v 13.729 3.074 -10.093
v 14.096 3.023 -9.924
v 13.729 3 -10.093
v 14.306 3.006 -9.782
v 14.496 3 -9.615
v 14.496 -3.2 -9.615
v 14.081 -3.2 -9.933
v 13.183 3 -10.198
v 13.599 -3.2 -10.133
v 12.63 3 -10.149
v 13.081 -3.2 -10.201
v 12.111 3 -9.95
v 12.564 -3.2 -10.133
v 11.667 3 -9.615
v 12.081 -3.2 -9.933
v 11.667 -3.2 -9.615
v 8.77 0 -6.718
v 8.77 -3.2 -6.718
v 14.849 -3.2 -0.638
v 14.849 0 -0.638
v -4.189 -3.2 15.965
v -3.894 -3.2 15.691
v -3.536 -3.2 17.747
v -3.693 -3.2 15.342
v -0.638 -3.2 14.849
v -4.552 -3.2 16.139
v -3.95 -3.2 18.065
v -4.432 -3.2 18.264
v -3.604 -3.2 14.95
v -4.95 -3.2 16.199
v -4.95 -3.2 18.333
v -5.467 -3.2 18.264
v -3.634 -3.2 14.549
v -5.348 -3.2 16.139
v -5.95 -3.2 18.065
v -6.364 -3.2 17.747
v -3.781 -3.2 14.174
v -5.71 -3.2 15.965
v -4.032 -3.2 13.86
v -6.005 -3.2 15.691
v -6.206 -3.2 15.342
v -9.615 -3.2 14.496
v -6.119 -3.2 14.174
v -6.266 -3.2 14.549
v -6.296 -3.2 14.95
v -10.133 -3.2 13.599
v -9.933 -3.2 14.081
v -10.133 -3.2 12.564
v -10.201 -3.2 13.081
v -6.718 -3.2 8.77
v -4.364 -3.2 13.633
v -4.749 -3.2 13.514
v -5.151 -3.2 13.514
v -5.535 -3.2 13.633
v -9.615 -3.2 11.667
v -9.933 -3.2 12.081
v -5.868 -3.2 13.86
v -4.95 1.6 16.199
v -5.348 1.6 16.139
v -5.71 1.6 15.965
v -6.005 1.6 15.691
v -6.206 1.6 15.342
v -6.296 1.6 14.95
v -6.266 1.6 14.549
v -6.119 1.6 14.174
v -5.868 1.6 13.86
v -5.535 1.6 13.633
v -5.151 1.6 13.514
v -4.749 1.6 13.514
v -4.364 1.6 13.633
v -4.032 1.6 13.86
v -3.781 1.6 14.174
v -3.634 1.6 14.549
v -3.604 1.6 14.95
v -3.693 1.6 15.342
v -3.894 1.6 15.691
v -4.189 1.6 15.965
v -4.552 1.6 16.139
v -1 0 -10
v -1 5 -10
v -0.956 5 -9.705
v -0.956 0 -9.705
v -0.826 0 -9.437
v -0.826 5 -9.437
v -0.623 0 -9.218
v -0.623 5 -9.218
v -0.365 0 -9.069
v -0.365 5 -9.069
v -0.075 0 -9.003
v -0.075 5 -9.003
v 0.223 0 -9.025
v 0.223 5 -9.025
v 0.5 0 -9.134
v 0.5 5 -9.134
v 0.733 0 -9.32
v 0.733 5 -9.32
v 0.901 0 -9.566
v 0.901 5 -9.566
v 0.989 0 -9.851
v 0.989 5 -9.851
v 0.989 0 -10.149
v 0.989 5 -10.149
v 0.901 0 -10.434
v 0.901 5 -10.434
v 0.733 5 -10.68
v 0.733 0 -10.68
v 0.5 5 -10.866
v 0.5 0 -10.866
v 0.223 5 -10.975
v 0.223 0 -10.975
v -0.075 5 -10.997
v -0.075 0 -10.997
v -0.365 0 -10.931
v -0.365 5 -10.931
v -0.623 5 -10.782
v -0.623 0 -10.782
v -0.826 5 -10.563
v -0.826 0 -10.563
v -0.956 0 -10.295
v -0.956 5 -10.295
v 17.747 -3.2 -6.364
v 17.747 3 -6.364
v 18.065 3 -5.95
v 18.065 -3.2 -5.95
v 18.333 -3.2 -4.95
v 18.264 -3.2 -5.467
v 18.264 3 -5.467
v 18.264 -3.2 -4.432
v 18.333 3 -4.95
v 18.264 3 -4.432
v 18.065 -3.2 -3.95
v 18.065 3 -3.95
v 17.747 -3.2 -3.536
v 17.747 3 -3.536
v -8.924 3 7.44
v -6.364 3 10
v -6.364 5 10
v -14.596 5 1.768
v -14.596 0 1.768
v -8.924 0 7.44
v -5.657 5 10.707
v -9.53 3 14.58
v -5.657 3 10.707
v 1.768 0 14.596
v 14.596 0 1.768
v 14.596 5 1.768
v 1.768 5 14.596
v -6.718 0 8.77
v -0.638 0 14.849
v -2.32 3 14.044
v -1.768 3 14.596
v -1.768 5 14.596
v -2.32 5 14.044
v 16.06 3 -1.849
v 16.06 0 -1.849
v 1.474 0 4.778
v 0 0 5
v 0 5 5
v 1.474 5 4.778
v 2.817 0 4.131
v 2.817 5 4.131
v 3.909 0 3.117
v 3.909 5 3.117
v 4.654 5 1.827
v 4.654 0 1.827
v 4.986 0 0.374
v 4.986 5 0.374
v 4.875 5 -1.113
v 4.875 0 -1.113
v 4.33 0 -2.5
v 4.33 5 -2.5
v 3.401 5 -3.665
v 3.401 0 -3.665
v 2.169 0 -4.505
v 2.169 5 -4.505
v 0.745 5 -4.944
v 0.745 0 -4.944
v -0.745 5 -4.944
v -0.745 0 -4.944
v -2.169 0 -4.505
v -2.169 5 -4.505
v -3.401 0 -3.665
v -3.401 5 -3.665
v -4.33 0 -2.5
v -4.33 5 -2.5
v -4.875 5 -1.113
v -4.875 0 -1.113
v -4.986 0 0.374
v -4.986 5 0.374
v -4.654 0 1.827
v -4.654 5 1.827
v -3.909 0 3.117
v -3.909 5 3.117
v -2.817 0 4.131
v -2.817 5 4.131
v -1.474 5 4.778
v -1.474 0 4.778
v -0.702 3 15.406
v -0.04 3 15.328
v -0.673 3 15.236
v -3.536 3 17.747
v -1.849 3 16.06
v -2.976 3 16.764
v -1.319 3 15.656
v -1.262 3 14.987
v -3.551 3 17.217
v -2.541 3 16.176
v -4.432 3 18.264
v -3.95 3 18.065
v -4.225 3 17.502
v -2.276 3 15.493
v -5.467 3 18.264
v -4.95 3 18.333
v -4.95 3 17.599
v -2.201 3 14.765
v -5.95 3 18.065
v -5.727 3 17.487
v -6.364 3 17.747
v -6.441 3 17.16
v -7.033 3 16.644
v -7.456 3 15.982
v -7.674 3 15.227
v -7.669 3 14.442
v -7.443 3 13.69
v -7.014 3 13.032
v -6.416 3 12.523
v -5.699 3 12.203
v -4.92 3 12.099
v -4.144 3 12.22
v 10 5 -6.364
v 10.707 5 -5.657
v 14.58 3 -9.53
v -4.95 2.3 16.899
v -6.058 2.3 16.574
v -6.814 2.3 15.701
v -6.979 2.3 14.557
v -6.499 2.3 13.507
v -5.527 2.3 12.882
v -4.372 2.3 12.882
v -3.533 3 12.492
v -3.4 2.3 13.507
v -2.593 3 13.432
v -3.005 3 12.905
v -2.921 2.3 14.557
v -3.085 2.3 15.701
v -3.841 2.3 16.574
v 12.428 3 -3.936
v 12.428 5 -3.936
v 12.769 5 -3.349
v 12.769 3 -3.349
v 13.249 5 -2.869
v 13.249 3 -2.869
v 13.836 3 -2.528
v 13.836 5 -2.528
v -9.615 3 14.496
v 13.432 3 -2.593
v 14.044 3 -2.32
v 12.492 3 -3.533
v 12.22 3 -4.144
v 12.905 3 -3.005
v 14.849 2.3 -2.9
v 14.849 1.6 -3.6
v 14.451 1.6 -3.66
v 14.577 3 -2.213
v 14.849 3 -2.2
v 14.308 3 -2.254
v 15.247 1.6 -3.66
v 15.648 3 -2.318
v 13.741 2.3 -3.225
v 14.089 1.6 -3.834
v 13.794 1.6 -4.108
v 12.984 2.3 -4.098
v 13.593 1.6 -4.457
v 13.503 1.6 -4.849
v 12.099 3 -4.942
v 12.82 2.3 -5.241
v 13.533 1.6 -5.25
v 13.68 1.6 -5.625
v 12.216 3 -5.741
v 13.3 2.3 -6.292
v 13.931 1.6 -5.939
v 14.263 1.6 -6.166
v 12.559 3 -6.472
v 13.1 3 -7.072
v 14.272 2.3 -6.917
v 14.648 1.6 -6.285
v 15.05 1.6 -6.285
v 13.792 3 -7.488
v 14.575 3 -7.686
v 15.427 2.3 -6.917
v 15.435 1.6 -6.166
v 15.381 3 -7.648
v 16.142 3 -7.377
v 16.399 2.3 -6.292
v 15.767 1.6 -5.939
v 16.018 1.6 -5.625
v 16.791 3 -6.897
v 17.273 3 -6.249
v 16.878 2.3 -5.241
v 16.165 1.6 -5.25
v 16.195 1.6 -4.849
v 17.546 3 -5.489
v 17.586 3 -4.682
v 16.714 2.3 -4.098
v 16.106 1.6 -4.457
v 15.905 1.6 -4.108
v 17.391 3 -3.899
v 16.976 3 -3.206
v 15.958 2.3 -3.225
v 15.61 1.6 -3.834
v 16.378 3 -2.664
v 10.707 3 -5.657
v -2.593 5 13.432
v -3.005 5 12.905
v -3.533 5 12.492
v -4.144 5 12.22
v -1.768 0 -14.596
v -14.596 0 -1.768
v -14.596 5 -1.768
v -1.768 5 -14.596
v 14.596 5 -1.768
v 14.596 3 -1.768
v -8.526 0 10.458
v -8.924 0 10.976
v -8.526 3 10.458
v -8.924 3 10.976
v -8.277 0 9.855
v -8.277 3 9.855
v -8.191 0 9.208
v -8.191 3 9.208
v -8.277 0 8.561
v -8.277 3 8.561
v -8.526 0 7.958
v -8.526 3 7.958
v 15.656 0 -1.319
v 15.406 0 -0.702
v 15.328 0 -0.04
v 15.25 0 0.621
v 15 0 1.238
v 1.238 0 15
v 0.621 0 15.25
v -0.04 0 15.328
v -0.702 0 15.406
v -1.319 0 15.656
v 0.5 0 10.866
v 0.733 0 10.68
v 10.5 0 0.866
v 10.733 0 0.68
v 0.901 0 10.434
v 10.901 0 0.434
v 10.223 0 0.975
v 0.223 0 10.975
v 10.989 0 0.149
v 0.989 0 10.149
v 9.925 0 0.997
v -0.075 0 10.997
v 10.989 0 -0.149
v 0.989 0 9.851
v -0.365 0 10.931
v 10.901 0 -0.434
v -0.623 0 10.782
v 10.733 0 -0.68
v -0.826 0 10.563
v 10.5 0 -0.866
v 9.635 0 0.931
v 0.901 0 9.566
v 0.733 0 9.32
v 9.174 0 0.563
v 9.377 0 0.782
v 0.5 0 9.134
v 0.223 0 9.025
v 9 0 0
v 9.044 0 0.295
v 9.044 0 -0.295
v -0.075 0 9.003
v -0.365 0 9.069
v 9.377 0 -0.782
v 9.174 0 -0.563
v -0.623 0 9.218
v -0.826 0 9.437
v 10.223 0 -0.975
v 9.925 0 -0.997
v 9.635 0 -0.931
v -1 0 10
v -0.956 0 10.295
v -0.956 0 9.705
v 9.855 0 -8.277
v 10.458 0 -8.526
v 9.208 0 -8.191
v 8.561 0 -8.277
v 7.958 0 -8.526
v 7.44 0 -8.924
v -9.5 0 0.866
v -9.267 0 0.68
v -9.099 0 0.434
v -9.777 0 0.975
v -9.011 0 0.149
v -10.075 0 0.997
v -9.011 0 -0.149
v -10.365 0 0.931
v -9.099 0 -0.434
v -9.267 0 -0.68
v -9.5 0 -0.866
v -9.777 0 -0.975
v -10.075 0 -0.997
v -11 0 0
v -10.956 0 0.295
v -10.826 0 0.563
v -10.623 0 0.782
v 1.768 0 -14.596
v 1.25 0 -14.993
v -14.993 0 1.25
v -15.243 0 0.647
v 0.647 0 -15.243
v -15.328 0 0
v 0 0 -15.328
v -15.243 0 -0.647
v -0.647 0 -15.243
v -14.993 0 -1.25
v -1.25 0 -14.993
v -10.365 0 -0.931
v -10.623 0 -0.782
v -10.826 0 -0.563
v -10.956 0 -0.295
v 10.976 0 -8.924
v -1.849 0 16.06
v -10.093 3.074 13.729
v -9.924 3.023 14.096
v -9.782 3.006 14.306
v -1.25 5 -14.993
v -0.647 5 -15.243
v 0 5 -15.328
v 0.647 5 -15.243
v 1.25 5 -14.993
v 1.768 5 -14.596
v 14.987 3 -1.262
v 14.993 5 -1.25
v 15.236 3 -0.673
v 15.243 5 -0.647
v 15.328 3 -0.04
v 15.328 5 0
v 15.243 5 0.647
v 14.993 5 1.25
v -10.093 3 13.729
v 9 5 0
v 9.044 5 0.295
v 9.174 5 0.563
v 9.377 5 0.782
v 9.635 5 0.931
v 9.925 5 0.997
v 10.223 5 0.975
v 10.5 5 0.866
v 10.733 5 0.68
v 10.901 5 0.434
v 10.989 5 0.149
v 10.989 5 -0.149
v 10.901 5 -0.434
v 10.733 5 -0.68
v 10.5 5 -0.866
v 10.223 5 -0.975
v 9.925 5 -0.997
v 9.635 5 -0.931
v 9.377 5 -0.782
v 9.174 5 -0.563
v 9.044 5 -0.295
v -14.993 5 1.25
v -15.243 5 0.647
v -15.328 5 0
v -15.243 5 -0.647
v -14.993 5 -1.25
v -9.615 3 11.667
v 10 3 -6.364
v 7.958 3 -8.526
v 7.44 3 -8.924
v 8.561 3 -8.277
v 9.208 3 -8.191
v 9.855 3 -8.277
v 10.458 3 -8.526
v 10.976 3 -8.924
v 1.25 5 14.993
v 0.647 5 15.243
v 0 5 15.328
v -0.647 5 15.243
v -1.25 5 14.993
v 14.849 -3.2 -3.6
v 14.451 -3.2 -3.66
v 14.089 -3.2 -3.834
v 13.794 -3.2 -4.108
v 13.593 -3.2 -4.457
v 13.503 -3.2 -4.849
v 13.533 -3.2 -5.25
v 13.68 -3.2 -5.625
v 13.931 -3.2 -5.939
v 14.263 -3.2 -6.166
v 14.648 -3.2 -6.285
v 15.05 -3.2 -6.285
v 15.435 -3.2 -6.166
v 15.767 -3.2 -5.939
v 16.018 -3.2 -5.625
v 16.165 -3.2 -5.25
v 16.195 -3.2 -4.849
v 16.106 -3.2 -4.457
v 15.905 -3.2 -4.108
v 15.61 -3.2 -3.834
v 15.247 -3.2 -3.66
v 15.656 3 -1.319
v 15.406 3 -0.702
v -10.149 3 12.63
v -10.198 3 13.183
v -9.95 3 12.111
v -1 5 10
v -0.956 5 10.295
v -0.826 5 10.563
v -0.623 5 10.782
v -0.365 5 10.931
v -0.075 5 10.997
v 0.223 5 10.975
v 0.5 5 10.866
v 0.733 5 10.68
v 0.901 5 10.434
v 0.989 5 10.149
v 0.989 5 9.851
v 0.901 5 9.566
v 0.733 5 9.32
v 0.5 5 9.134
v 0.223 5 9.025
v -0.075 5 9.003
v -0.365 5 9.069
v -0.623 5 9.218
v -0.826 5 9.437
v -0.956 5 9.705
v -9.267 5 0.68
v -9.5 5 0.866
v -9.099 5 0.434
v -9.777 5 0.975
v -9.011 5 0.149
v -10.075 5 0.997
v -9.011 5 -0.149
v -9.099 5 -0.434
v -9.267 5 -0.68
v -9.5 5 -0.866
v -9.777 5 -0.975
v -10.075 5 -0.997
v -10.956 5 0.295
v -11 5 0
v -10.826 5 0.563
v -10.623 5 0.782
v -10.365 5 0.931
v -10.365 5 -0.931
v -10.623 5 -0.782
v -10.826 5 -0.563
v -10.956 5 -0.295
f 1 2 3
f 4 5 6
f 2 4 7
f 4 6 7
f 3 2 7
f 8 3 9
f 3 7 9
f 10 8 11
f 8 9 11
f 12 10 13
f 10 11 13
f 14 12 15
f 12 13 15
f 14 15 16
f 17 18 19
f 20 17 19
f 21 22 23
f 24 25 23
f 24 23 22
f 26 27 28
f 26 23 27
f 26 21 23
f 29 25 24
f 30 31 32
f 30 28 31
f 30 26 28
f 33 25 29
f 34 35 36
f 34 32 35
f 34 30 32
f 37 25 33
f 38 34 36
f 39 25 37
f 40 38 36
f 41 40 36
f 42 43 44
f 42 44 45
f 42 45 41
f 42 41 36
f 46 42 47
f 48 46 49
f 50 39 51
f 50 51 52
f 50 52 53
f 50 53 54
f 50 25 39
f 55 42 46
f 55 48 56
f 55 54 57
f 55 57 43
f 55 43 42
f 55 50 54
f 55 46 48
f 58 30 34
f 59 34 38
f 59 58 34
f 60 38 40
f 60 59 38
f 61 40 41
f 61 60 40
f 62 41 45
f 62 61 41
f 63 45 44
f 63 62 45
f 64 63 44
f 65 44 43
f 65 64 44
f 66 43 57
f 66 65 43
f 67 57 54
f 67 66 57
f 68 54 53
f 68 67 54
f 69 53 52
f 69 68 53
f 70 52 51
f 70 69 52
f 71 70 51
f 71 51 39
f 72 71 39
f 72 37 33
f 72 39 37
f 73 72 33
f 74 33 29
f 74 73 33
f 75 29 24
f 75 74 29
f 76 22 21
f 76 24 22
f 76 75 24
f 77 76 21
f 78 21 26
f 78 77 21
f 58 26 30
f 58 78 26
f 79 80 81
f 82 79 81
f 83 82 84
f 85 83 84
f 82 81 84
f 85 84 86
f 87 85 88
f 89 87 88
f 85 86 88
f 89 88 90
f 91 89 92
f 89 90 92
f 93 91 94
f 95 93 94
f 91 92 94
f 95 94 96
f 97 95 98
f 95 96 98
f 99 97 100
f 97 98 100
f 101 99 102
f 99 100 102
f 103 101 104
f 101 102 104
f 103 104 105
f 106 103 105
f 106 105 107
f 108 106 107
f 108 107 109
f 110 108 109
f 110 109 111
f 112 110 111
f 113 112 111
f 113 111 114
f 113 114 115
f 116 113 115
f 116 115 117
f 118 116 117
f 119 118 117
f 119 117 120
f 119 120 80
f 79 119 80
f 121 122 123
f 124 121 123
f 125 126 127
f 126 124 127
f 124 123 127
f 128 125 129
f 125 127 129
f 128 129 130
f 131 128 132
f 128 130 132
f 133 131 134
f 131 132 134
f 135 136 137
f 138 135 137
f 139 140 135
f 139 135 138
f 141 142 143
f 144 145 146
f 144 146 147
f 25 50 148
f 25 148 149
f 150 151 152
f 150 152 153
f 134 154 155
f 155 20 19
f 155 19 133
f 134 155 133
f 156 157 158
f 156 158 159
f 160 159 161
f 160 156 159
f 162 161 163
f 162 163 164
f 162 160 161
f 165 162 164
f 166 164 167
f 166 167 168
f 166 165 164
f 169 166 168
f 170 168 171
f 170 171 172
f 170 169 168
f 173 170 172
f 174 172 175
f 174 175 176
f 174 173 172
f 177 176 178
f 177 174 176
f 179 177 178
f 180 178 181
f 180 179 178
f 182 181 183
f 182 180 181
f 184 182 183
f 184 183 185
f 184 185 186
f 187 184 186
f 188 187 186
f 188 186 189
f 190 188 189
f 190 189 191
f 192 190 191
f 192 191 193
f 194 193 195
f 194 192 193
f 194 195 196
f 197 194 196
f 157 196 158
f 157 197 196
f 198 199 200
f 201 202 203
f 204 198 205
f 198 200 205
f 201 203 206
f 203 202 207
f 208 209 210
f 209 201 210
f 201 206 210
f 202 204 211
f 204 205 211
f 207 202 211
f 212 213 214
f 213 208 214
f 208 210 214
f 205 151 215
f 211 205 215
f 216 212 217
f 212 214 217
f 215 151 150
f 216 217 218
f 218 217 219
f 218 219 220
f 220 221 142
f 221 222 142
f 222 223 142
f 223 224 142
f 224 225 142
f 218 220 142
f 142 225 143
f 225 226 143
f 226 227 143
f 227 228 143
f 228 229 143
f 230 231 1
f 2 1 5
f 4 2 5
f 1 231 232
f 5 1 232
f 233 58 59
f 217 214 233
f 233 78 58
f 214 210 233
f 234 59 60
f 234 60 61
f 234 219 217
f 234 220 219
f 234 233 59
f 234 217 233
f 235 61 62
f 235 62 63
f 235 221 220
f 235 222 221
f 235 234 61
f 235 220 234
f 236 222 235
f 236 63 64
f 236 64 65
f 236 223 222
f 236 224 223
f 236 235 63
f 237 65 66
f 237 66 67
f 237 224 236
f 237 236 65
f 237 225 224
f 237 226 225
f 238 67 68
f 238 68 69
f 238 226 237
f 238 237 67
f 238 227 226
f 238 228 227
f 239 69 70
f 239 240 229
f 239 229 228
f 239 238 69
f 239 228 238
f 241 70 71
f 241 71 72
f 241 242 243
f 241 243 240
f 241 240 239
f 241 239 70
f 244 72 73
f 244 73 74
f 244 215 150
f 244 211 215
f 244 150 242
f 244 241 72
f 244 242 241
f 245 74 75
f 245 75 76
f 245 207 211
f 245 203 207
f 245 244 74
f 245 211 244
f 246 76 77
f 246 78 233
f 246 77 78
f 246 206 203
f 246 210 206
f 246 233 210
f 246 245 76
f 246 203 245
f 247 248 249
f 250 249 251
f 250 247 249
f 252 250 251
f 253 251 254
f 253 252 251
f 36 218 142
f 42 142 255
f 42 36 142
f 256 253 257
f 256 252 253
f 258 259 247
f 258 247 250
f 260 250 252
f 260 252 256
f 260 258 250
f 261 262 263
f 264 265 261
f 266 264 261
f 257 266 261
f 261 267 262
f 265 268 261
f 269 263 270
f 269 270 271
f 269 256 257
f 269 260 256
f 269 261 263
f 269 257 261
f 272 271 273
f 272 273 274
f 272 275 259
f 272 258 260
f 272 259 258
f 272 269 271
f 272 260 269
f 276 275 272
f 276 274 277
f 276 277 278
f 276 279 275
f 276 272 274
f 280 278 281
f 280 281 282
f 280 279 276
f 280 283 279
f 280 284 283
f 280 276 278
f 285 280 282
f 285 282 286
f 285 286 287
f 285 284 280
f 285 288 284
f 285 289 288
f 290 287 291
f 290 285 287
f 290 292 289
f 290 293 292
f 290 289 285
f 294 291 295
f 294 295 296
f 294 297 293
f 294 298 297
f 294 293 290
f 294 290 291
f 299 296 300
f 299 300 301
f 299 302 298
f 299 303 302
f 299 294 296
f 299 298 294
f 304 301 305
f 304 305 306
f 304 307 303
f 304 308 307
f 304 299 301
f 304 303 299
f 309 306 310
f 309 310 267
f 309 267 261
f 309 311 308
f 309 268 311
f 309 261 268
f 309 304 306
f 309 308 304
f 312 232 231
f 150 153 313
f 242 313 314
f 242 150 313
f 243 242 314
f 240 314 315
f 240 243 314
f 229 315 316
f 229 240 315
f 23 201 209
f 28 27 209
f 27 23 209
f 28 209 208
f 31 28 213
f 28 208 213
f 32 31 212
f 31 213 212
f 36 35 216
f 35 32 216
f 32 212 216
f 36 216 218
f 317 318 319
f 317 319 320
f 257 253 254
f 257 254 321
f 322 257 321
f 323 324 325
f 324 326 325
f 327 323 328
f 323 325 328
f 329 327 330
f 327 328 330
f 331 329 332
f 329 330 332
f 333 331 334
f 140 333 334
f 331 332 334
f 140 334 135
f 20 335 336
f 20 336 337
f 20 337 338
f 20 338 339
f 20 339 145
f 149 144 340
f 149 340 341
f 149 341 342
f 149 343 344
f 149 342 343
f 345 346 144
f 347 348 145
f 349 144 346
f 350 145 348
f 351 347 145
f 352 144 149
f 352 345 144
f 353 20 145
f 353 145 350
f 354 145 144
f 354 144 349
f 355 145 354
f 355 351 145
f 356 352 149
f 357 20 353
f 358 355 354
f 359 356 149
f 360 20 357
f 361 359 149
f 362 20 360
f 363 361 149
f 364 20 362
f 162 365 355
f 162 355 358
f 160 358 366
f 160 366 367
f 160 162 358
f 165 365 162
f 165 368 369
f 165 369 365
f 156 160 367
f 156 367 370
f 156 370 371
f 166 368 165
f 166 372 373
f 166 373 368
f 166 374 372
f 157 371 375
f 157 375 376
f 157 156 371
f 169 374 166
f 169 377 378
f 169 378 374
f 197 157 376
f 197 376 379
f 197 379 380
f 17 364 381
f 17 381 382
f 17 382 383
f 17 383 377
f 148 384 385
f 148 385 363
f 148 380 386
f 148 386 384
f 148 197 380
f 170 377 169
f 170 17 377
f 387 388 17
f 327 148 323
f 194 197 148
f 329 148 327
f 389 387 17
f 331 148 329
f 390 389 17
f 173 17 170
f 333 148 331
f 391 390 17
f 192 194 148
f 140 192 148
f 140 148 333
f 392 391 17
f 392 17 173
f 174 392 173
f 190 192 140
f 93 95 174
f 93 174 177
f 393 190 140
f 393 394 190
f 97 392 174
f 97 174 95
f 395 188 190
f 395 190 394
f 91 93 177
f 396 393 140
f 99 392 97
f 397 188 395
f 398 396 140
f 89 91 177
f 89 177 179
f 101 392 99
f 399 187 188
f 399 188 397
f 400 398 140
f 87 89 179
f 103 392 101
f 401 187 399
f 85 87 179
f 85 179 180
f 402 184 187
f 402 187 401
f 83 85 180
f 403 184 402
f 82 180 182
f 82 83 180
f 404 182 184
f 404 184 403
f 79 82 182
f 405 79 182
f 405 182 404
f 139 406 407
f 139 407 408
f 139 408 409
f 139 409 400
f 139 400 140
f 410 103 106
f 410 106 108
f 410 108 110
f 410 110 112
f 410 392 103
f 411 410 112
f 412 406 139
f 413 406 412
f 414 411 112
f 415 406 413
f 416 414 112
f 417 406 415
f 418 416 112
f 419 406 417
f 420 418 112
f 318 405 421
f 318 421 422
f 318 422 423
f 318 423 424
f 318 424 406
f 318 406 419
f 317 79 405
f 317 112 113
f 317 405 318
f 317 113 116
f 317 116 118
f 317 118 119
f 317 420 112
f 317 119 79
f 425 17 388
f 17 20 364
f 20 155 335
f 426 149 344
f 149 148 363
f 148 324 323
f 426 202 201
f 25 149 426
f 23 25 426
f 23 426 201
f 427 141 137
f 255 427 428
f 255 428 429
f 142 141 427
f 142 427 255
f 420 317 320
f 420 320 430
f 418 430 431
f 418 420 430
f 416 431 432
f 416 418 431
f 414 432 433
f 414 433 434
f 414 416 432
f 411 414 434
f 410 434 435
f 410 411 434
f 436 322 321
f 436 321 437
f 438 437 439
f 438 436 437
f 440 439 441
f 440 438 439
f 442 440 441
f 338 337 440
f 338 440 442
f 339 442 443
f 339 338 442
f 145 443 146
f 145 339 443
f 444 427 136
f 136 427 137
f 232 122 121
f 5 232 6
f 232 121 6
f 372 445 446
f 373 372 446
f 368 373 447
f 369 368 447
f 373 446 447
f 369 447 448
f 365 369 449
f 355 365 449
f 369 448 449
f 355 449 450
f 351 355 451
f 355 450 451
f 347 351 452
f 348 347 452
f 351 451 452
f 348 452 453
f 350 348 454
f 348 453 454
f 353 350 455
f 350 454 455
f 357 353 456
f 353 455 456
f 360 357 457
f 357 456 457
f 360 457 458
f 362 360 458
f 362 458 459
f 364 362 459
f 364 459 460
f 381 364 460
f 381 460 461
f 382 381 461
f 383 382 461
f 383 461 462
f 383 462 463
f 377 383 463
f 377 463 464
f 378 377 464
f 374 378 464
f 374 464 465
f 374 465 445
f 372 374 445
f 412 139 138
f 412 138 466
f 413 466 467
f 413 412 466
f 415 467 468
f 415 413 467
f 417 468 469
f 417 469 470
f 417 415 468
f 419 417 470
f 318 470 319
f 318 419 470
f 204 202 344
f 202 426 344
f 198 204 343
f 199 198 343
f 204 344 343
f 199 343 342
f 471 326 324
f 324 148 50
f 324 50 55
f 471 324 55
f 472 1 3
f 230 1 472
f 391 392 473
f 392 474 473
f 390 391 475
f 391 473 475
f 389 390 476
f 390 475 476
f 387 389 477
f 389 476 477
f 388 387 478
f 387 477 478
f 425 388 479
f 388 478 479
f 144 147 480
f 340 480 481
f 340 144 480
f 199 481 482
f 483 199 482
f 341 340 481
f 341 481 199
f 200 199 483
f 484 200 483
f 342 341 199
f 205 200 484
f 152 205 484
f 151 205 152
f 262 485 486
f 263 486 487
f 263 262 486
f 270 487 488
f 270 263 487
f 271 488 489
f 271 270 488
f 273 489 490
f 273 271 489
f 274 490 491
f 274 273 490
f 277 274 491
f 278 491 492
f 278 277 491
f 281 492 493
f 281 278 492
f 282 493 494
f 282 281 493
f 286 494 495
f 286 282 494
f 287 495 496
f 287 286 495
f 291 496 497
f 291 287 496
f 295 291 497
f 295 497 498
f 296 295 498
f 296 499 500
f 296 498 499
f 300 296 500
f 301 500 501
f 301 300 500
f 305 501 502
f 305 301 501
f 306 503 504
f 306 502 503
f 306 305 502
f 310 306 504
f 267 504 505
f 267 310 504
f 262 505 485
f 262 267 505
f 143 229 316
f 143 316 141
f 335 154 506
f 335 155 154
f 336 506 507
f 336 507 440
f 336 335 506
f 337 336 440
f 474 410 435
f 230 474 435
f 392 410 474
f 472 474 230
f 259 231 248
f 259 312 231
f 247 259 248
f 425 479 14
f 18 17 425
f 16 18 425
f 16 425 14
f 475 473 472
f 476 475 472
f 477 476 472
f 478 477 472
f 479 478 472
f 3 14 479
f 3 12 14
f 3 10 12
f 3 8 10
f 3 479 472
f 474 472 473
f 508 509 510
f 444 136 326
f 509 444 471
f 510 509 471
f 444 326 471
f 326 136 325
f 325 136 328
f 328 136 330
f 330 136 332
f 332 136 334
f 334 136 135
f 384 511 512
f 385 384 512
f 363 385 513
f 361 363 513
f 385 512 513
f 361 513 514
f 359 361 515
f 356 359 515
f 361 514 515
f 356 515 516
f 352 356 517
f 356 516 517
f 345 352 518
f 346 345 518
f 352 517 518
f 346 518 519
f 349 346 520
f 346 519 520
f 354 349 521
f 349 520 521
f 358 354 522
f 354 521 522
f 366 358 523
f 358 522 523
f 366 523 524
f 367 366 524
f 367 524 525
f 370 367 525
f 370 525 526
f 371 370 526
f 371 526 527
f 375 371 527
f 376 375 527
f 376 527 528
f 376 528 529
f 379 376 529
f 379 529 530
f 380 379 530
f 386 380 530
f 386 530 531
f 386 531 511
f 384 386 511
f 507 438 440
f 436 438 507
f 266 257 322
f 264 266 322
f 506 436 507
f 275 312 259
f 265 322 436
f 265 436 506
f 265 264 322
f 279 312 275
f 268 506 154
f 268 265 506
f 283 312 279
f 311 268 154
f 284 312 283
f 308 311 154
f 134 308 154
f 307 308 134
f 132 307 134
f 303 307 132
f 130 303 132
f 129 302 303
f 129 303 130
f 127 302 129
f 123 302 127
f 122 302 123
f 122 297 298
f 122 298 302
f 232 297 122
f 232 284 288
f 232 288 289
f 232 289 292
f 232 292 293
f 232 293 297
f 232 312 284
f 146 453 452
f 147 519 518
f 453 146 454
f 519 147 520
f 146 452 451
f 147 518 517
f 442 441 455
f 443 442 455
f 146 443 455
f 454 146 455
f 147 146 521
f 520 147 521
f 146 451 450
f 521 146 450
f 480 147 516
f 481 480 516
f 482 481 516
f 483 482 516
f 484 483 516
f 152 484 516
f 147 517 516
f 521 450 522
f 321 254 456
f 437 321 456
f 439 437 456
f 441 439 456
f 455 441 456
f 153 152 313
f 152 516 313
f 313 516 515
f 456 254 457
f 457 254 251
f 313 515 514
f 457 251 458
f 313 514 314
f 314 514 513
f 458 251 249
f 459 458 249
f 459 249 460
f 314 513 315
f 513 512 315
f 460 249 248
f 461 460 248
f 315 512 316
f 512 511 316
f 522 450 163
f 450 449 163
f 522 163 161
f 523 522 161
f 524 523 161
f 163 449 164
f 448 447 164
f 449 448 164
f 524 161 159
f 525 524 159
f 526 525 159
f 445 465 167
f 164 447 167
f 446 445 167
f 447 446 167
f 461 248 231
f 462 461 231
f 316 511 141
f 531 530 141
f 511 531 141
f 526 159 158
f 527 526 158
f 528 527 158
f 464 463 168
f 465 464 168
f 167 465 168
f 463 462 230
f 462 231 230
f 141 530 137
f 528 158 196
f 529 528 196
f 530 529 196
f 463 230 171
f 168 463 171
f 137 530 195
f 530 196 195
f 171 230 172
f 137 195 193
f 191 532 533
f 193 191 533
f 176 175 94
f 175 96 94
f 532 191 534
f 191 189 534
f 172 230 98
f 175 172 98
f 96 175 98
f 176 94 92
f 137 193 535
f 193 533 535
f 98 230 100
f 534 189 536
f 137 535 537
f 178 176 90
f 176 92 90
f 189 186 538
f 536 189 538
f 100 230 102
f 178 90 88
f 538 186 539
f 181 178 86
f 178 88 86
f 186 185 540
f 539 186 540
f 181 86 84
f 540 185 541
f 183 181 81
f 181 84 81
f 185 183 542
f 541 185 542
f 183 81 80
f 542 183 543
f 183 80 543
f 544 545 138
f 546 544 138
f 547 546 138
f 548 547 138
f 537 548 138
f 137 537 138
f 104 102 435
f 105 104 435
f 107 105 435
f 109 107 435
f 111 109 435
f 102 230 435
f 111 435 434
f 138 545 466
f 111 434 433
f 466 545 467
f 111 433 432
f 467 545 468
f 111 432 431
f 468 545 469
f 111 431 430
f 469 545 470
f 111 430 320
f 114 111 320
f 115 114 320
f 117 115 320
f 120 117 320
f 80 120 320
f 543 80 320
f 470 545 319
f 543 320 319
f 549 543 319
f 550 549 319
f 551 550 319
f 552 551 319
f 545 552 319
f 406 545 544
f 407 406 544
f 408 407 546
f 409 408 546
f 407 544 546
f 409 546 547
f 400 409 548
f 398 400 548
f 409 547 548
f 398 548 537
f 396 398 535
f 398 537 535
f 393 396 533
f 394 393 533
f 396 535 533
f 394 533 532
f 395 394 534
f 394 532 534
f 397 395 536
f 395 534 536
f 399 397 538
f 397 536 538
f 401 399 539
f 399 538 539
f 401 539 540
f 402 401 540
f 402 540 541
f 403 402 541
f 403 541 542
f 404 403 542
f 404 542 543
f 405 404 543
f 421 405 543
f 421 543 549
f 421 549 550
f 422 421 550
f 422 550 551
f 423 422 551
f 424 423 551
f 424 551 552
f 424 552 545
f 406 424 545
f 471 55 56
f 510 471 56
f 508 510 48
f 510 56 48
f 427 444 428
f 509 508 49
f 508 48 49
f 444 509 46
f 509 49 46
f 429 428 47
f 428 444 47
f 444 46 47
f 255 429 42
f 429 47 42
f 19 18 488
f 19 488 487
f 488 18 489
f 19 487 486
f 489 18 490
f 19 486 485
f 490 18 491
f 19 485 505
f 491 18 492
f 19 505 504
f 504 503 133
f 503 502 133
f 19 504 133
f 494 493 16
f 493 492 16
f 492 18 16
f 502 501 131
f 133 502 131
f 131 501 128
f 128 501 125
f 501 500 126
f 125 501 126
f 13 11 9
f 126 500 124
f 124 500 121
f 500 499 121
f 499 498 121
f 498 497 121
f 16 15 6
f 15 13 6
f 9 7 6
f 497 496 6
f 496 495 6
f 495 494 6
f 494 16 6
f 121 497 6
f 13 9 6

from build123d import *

# Parameters (mm, degrees)
SKETCH1_R                                      = 0.5
SKETCH1_R_2                                    = 5
BOSS_EXTRUDE1_DEPTH                            = 5
BOSS_EXTRUDE4_DEPTH                            = 5.7
BOSS_EXTRUDE4_DEPTH_BACK                       = 0.5
SKETCH3_R                                      = 1.3
BOSS_EXTRUDE6_DEPTH                            = 1
FILLET1_R                                      = 2.5
FILLET2_R                                      = 2
F_2_0MM_DOWEL_HOLE1_D                          = 2
F_2_0MM_DOWEL_HOLE1_DEPTH                      = 42.93
F_2_0MM_DOWEL_HOLE1_TIP                        = 0.600860619
SKETCH12_R                                     = 2.75
SKETCH12_R_2                                   = 2.625
CUT_EXTRUDE1_DEPTH                             = 10
CSK_FOR_M2_5_FLAT_HEAD_MACHINE_SCREW1_AT_COUNT = 2
CSK_FOR_M2_5_FLAT_HEAD_MACHINE_SCREW1_AT_PITCH = 28


with BuildPart() as part:
    # Sketch1 → Boss-Extrude1 (new body)
    with BuildSketch(Plane(origin=(0, 0, 0), x_dir=(1, 0, 0), z_dir=(0, 1, 0))):
        with BuildLine():
            Line((1.767766953, 14.596194078), (14.596194078, 1.767766953))
            ThreePointArc((14.596194078, 1.767766953), (15.328427125, 0), (14.596194078, -1.767766953))
            Line((14.596194078, -1.767766953), (1.767766953, -14.596194078))
            ThreePointArc((1.767766953, -14.596194078), (0, -15.328427125), (-1.767766953, -14.596194078))
            Line((-1.767766953, -14.596194078), (-14.596194078, -1.767766953))
            ThreePointArc((-14.596194078, -1.767766953), (-15.328427125, 0), (-14.596194078, 1.767766953))
            Line((-14.596194078, 1.767766953), (-1.767766953, 14.596194078))
            ThreePointArc((-1.767766953, 14.596194078), (0, 15.328427125), (1.767766953, 14.596194078))
        make_face()
        with Locations(Location((0, 10, 0), (0, 0, 270))):
            Circle(SKETCH1_R, mode=Mode.SUBTRACT)
        with Locations(Location((0, -10, 0), (0, 0, 270))):
            Circle(SKETCH1_R, mode=Mode.SUBTRACT)
        with Locations(Location((10, 0, 0), (0, 0, 270))):
            Circle(SKETCH1_R, mode=Mode.SUBTRACT)
        with Locations(Location((-10, 0, 0), (0, 0, 270))):
            Circle(SKETCH1_R, mode=Mode.SUBTRACT)
        with Locations(Location((0, 0, 0), (0, 0, 270))):
            Circle(SKETCH1_R_2, mode=Mode.SUBTRACT)
    extrude(amount=BOSS_EXTRUDE1_DEPTH)

    # Sketch3 → Boss-Extrude4 (add, two sides: drawn at the far end of the back side and taken through both)
    # profile 1 of 4: a face of its own
    with BuildSketch(Plane(origin=(0, -2.7, 0), x_dir=(1, 0, 0), z_dir=(0, 1, 0)).offset(-BOSS_EXTRUDE4_DEPTH_BACK)):
        Polygon((-4.949747468, -10.537489101), (-0.637994164, -14.849242405), (-4.949747468, -19.160995709), (-9.261500772, -14.849242405), align=None)
        with Locations(Location((-4.949747468, -14.849242405, 0), (0, 0, 270))):
            Circle(SKETCH3_R, mode=Mode.SUBTRACT)
    # profile 2 of 4: a face of its own
    with BuildSketch(Plane(origin=(0, -2.7, 0), x_dir=(1, 0, 0), z_dir=(0, 1, 0)).offset(-BOSS_EXTRUDE4_DEPTH_BACK)):
        Polygon((-6.717514421, -8.769722148), (-11.029267725, -13.081475452), (-9.261500772, -14.849242405), (-4.949747468, -10.537489101), align=None)
    # profile 3 of 4: a face of its own
    with BuildSketch(Plane(origin=(0, -2.7, 0), x_dir=(1, 0, 0), z_dir=(0, 1, 0)).offset(-BOSS_EXTRUDE4_DEPTH_BACK)):
        Polygon((19.160995709, 4.949747468), (14.849242405, 9.261500772), (10.537489101, 4.949747468), (14.849242405, 0.637994164), align=None)
        with Locations(Location((14.849242405, 4.949747468, 0), (0, 0, 270))):
            Circle(SKETCH3_R, mode=Mode.SUBTRACT)
    # profile 4 of 4: a face of its own
    with BuildSketch(Plane(origin=(0, -2.7, 0), x_dir=(1, 0, 0), z_dir=(0, 1, 0)).offset(-BOSS_EXTRUDE4_DEPTH_BACK)):
        Polygon((13.081475452, 11.029267725), (14.849242405, 9.261500772), (10.537489101, 4.949747468), (8.769722148, 6.717514421), align=None)
    extrude(amount=BOSS_EXTRUDE4_DEPTH + BOSS_EXTRUDE4_DEPTH_BACK)


with BuildPart() as boss_extrude6_tool:
    # Sketch7 → Boss-Extrude6 (new body)
    with BuildSketch(Plane(origin=(2.525126055, -2.13e-07, 2.525126055), x_dir=(0.7071067811865474, 0, -0.7071067811865477), z_dir=(0.7071067811865465, -5.960464483662305e-08, 0.7071067811865461))):
        Polygon((11.571067812, 5.000000541), (17.04887, 3.00000056), (11.571067812, 3.000000541), align=None)
        Polygon((-11.571067812, 5.000000541), (-17.04887, 3.00000056), (-11.571067812, 3.000000541), align=None)
    extrude(amount=-BOSS_EXTRUDE6_DEPTH)


with BuildPart() as part_1:
    add(part.part)


with BuildPart() as part_2:
    # Boss-Extrude6: joined with boss_extrude6_tool
    add(part_1.part.fuse(boss_extrude6_tool.part, tol=0.00001))

    # Fillet1
    fillet1_edges = [part_2.edges().sort_by_distance(p)[0] for p in [
        (-7.155876652, 1.5, 9.208084379),
        (-0.935534875, 1.5, 15.146783115),
        (9.208084379, 1.5, -7.155876652),
        (15.146783115, 1.5, -0.935534875),
    ]]
    fillet(fillet1_edges, radius=FILLET1_R)

    # Fillet2
    # the kernel refuses this fillet: 2 mm, written as the material it takes off along each edge
    with BuildSketch(Plane(origin=(-4.949747468, 8, 19.160995709), x_dir=(0.7071067811865477, 0, -0.7071067811865475), z_dir=(0, -1, 0)), Plane(origin=(-11.029267725, -8.2, 13.081475452), x_dir=(0.7071067811865476, 0, -0.7071067811865476), z_dir=(0, 1, 0))) as fillet2_piece_1:
        with BuildLine():
            CenterArc((FILLET2_R, -FILLET2_R), FILLET2_R, 90, 90)
            Line((0, -FILLET2_R), (0, 0))
            Line((0, 0), (FILLET2_R, 0))
        make_face()
    extrude(amount=16.2, mode=Mode.SUBTRACT)
    with BuildSketch(Plane(origin=(13.081475452, -8.2, -11.029267725), x_dir=(-0.7071067811865471, 0, 0.707106781186548), z_dir=(0, 1, 0)), Plane(origin=(19.160995709, 8, -4.949747468), x_dir=(-0.7071067811865472, 0, 0.7071067811865477), z_dir=(0, -1, 0))) as fillet2_piece_2:
        with BuildLine():
            CenterArc((FILLET2_R, FILLET2_R), FILLET2_R, 180, 90)
            Line((0, FILLET2_R), (0, 0))
            Line((0, 0), (FILLET2_R, 0))
        make_face()
    extrude(amount=16.2, mode=Mode.SUBTRACT)

    # Ø2.0mm Dowel Hole1
    with Locations(Plane.XZ):
        with Locations((0, 10), (10, 0), (-10, 0), (0, -10)):
            Hole(F_2_0MM_DOWEL_HOLE1_D / 2, depth=F_2_0MM_DOWEL_HOLE1_DEPTH)
            with Locations((0, 0, -(F_2_0MM_DOWEL_HOLE1_DEPTH + F_2_0MM_DOWEL_HOLE1_TIP / 2))):  # 118° drill point
                Cone(0, F_2_0MM_DOWEL_HOLE1_D / 2, F_2_0MM_DOWEL_HOLE1_TIP, mode=Mode.SUBTRACT)

    # Sketch12 → Cut-Extrude1 (cut)
    with BuildSketch(Plane(origin=(0, 3, 0), x_dir=(1, 0, 0), z_dir=(0, 1, 0))):
        with Locations((-4.949747468, -14.849242405)):
            Circle(SKETCH12_R)
        with Locations((14.849242405, 4.949747468)):
            Circle(SKETCH12_R_2)
    extrude(amount=CUT_EXTRUDE1_DEPTH, mode=Mode.SUBTRACT)

    # Sketch13 → CSK for M2.5 Flat Head Machine Screw1 (revolve, cut)
    with BuildSketch(Plane(origin=(-4.949747468, 3, 14.849242405), x_dir=(0, 0, 1), z_dir=(1, 0, 0))):
        Polygon((0, 0), (0, 43.741161836), (1.35, 42.93), (1.35, 1.4), (2.75, 0), align=None)
    csk_for_m2_5_flat_head_machine_screw1 = revolve(axis=Axis((-4.949747468, 9.35, 14.849242405), (0, -1, 0)), mode=Mode.SUBTRACT)

    # CSK for M2.5 Flat Head Machine Screw1 at: CSK for M2.5 Flat Head Machine Screw1 ×2
    with Locations(*[Vector(0.7071067811865477, 0, -0.7071067811865475) * (i * CSK_FOR_M2_5_FLAT_HEAD_MACHINE_SCREW1_AT_PITCH) for i in range(1, CSK_FOR_M2_5_FLAT_HEAD_MACHINE_SCREW1_AT_COUNT)]):
        add(csk_for_m2_5_flat_head_machine_screw1, mode=Mode.SUBTRACT)


solid = part_2.part
